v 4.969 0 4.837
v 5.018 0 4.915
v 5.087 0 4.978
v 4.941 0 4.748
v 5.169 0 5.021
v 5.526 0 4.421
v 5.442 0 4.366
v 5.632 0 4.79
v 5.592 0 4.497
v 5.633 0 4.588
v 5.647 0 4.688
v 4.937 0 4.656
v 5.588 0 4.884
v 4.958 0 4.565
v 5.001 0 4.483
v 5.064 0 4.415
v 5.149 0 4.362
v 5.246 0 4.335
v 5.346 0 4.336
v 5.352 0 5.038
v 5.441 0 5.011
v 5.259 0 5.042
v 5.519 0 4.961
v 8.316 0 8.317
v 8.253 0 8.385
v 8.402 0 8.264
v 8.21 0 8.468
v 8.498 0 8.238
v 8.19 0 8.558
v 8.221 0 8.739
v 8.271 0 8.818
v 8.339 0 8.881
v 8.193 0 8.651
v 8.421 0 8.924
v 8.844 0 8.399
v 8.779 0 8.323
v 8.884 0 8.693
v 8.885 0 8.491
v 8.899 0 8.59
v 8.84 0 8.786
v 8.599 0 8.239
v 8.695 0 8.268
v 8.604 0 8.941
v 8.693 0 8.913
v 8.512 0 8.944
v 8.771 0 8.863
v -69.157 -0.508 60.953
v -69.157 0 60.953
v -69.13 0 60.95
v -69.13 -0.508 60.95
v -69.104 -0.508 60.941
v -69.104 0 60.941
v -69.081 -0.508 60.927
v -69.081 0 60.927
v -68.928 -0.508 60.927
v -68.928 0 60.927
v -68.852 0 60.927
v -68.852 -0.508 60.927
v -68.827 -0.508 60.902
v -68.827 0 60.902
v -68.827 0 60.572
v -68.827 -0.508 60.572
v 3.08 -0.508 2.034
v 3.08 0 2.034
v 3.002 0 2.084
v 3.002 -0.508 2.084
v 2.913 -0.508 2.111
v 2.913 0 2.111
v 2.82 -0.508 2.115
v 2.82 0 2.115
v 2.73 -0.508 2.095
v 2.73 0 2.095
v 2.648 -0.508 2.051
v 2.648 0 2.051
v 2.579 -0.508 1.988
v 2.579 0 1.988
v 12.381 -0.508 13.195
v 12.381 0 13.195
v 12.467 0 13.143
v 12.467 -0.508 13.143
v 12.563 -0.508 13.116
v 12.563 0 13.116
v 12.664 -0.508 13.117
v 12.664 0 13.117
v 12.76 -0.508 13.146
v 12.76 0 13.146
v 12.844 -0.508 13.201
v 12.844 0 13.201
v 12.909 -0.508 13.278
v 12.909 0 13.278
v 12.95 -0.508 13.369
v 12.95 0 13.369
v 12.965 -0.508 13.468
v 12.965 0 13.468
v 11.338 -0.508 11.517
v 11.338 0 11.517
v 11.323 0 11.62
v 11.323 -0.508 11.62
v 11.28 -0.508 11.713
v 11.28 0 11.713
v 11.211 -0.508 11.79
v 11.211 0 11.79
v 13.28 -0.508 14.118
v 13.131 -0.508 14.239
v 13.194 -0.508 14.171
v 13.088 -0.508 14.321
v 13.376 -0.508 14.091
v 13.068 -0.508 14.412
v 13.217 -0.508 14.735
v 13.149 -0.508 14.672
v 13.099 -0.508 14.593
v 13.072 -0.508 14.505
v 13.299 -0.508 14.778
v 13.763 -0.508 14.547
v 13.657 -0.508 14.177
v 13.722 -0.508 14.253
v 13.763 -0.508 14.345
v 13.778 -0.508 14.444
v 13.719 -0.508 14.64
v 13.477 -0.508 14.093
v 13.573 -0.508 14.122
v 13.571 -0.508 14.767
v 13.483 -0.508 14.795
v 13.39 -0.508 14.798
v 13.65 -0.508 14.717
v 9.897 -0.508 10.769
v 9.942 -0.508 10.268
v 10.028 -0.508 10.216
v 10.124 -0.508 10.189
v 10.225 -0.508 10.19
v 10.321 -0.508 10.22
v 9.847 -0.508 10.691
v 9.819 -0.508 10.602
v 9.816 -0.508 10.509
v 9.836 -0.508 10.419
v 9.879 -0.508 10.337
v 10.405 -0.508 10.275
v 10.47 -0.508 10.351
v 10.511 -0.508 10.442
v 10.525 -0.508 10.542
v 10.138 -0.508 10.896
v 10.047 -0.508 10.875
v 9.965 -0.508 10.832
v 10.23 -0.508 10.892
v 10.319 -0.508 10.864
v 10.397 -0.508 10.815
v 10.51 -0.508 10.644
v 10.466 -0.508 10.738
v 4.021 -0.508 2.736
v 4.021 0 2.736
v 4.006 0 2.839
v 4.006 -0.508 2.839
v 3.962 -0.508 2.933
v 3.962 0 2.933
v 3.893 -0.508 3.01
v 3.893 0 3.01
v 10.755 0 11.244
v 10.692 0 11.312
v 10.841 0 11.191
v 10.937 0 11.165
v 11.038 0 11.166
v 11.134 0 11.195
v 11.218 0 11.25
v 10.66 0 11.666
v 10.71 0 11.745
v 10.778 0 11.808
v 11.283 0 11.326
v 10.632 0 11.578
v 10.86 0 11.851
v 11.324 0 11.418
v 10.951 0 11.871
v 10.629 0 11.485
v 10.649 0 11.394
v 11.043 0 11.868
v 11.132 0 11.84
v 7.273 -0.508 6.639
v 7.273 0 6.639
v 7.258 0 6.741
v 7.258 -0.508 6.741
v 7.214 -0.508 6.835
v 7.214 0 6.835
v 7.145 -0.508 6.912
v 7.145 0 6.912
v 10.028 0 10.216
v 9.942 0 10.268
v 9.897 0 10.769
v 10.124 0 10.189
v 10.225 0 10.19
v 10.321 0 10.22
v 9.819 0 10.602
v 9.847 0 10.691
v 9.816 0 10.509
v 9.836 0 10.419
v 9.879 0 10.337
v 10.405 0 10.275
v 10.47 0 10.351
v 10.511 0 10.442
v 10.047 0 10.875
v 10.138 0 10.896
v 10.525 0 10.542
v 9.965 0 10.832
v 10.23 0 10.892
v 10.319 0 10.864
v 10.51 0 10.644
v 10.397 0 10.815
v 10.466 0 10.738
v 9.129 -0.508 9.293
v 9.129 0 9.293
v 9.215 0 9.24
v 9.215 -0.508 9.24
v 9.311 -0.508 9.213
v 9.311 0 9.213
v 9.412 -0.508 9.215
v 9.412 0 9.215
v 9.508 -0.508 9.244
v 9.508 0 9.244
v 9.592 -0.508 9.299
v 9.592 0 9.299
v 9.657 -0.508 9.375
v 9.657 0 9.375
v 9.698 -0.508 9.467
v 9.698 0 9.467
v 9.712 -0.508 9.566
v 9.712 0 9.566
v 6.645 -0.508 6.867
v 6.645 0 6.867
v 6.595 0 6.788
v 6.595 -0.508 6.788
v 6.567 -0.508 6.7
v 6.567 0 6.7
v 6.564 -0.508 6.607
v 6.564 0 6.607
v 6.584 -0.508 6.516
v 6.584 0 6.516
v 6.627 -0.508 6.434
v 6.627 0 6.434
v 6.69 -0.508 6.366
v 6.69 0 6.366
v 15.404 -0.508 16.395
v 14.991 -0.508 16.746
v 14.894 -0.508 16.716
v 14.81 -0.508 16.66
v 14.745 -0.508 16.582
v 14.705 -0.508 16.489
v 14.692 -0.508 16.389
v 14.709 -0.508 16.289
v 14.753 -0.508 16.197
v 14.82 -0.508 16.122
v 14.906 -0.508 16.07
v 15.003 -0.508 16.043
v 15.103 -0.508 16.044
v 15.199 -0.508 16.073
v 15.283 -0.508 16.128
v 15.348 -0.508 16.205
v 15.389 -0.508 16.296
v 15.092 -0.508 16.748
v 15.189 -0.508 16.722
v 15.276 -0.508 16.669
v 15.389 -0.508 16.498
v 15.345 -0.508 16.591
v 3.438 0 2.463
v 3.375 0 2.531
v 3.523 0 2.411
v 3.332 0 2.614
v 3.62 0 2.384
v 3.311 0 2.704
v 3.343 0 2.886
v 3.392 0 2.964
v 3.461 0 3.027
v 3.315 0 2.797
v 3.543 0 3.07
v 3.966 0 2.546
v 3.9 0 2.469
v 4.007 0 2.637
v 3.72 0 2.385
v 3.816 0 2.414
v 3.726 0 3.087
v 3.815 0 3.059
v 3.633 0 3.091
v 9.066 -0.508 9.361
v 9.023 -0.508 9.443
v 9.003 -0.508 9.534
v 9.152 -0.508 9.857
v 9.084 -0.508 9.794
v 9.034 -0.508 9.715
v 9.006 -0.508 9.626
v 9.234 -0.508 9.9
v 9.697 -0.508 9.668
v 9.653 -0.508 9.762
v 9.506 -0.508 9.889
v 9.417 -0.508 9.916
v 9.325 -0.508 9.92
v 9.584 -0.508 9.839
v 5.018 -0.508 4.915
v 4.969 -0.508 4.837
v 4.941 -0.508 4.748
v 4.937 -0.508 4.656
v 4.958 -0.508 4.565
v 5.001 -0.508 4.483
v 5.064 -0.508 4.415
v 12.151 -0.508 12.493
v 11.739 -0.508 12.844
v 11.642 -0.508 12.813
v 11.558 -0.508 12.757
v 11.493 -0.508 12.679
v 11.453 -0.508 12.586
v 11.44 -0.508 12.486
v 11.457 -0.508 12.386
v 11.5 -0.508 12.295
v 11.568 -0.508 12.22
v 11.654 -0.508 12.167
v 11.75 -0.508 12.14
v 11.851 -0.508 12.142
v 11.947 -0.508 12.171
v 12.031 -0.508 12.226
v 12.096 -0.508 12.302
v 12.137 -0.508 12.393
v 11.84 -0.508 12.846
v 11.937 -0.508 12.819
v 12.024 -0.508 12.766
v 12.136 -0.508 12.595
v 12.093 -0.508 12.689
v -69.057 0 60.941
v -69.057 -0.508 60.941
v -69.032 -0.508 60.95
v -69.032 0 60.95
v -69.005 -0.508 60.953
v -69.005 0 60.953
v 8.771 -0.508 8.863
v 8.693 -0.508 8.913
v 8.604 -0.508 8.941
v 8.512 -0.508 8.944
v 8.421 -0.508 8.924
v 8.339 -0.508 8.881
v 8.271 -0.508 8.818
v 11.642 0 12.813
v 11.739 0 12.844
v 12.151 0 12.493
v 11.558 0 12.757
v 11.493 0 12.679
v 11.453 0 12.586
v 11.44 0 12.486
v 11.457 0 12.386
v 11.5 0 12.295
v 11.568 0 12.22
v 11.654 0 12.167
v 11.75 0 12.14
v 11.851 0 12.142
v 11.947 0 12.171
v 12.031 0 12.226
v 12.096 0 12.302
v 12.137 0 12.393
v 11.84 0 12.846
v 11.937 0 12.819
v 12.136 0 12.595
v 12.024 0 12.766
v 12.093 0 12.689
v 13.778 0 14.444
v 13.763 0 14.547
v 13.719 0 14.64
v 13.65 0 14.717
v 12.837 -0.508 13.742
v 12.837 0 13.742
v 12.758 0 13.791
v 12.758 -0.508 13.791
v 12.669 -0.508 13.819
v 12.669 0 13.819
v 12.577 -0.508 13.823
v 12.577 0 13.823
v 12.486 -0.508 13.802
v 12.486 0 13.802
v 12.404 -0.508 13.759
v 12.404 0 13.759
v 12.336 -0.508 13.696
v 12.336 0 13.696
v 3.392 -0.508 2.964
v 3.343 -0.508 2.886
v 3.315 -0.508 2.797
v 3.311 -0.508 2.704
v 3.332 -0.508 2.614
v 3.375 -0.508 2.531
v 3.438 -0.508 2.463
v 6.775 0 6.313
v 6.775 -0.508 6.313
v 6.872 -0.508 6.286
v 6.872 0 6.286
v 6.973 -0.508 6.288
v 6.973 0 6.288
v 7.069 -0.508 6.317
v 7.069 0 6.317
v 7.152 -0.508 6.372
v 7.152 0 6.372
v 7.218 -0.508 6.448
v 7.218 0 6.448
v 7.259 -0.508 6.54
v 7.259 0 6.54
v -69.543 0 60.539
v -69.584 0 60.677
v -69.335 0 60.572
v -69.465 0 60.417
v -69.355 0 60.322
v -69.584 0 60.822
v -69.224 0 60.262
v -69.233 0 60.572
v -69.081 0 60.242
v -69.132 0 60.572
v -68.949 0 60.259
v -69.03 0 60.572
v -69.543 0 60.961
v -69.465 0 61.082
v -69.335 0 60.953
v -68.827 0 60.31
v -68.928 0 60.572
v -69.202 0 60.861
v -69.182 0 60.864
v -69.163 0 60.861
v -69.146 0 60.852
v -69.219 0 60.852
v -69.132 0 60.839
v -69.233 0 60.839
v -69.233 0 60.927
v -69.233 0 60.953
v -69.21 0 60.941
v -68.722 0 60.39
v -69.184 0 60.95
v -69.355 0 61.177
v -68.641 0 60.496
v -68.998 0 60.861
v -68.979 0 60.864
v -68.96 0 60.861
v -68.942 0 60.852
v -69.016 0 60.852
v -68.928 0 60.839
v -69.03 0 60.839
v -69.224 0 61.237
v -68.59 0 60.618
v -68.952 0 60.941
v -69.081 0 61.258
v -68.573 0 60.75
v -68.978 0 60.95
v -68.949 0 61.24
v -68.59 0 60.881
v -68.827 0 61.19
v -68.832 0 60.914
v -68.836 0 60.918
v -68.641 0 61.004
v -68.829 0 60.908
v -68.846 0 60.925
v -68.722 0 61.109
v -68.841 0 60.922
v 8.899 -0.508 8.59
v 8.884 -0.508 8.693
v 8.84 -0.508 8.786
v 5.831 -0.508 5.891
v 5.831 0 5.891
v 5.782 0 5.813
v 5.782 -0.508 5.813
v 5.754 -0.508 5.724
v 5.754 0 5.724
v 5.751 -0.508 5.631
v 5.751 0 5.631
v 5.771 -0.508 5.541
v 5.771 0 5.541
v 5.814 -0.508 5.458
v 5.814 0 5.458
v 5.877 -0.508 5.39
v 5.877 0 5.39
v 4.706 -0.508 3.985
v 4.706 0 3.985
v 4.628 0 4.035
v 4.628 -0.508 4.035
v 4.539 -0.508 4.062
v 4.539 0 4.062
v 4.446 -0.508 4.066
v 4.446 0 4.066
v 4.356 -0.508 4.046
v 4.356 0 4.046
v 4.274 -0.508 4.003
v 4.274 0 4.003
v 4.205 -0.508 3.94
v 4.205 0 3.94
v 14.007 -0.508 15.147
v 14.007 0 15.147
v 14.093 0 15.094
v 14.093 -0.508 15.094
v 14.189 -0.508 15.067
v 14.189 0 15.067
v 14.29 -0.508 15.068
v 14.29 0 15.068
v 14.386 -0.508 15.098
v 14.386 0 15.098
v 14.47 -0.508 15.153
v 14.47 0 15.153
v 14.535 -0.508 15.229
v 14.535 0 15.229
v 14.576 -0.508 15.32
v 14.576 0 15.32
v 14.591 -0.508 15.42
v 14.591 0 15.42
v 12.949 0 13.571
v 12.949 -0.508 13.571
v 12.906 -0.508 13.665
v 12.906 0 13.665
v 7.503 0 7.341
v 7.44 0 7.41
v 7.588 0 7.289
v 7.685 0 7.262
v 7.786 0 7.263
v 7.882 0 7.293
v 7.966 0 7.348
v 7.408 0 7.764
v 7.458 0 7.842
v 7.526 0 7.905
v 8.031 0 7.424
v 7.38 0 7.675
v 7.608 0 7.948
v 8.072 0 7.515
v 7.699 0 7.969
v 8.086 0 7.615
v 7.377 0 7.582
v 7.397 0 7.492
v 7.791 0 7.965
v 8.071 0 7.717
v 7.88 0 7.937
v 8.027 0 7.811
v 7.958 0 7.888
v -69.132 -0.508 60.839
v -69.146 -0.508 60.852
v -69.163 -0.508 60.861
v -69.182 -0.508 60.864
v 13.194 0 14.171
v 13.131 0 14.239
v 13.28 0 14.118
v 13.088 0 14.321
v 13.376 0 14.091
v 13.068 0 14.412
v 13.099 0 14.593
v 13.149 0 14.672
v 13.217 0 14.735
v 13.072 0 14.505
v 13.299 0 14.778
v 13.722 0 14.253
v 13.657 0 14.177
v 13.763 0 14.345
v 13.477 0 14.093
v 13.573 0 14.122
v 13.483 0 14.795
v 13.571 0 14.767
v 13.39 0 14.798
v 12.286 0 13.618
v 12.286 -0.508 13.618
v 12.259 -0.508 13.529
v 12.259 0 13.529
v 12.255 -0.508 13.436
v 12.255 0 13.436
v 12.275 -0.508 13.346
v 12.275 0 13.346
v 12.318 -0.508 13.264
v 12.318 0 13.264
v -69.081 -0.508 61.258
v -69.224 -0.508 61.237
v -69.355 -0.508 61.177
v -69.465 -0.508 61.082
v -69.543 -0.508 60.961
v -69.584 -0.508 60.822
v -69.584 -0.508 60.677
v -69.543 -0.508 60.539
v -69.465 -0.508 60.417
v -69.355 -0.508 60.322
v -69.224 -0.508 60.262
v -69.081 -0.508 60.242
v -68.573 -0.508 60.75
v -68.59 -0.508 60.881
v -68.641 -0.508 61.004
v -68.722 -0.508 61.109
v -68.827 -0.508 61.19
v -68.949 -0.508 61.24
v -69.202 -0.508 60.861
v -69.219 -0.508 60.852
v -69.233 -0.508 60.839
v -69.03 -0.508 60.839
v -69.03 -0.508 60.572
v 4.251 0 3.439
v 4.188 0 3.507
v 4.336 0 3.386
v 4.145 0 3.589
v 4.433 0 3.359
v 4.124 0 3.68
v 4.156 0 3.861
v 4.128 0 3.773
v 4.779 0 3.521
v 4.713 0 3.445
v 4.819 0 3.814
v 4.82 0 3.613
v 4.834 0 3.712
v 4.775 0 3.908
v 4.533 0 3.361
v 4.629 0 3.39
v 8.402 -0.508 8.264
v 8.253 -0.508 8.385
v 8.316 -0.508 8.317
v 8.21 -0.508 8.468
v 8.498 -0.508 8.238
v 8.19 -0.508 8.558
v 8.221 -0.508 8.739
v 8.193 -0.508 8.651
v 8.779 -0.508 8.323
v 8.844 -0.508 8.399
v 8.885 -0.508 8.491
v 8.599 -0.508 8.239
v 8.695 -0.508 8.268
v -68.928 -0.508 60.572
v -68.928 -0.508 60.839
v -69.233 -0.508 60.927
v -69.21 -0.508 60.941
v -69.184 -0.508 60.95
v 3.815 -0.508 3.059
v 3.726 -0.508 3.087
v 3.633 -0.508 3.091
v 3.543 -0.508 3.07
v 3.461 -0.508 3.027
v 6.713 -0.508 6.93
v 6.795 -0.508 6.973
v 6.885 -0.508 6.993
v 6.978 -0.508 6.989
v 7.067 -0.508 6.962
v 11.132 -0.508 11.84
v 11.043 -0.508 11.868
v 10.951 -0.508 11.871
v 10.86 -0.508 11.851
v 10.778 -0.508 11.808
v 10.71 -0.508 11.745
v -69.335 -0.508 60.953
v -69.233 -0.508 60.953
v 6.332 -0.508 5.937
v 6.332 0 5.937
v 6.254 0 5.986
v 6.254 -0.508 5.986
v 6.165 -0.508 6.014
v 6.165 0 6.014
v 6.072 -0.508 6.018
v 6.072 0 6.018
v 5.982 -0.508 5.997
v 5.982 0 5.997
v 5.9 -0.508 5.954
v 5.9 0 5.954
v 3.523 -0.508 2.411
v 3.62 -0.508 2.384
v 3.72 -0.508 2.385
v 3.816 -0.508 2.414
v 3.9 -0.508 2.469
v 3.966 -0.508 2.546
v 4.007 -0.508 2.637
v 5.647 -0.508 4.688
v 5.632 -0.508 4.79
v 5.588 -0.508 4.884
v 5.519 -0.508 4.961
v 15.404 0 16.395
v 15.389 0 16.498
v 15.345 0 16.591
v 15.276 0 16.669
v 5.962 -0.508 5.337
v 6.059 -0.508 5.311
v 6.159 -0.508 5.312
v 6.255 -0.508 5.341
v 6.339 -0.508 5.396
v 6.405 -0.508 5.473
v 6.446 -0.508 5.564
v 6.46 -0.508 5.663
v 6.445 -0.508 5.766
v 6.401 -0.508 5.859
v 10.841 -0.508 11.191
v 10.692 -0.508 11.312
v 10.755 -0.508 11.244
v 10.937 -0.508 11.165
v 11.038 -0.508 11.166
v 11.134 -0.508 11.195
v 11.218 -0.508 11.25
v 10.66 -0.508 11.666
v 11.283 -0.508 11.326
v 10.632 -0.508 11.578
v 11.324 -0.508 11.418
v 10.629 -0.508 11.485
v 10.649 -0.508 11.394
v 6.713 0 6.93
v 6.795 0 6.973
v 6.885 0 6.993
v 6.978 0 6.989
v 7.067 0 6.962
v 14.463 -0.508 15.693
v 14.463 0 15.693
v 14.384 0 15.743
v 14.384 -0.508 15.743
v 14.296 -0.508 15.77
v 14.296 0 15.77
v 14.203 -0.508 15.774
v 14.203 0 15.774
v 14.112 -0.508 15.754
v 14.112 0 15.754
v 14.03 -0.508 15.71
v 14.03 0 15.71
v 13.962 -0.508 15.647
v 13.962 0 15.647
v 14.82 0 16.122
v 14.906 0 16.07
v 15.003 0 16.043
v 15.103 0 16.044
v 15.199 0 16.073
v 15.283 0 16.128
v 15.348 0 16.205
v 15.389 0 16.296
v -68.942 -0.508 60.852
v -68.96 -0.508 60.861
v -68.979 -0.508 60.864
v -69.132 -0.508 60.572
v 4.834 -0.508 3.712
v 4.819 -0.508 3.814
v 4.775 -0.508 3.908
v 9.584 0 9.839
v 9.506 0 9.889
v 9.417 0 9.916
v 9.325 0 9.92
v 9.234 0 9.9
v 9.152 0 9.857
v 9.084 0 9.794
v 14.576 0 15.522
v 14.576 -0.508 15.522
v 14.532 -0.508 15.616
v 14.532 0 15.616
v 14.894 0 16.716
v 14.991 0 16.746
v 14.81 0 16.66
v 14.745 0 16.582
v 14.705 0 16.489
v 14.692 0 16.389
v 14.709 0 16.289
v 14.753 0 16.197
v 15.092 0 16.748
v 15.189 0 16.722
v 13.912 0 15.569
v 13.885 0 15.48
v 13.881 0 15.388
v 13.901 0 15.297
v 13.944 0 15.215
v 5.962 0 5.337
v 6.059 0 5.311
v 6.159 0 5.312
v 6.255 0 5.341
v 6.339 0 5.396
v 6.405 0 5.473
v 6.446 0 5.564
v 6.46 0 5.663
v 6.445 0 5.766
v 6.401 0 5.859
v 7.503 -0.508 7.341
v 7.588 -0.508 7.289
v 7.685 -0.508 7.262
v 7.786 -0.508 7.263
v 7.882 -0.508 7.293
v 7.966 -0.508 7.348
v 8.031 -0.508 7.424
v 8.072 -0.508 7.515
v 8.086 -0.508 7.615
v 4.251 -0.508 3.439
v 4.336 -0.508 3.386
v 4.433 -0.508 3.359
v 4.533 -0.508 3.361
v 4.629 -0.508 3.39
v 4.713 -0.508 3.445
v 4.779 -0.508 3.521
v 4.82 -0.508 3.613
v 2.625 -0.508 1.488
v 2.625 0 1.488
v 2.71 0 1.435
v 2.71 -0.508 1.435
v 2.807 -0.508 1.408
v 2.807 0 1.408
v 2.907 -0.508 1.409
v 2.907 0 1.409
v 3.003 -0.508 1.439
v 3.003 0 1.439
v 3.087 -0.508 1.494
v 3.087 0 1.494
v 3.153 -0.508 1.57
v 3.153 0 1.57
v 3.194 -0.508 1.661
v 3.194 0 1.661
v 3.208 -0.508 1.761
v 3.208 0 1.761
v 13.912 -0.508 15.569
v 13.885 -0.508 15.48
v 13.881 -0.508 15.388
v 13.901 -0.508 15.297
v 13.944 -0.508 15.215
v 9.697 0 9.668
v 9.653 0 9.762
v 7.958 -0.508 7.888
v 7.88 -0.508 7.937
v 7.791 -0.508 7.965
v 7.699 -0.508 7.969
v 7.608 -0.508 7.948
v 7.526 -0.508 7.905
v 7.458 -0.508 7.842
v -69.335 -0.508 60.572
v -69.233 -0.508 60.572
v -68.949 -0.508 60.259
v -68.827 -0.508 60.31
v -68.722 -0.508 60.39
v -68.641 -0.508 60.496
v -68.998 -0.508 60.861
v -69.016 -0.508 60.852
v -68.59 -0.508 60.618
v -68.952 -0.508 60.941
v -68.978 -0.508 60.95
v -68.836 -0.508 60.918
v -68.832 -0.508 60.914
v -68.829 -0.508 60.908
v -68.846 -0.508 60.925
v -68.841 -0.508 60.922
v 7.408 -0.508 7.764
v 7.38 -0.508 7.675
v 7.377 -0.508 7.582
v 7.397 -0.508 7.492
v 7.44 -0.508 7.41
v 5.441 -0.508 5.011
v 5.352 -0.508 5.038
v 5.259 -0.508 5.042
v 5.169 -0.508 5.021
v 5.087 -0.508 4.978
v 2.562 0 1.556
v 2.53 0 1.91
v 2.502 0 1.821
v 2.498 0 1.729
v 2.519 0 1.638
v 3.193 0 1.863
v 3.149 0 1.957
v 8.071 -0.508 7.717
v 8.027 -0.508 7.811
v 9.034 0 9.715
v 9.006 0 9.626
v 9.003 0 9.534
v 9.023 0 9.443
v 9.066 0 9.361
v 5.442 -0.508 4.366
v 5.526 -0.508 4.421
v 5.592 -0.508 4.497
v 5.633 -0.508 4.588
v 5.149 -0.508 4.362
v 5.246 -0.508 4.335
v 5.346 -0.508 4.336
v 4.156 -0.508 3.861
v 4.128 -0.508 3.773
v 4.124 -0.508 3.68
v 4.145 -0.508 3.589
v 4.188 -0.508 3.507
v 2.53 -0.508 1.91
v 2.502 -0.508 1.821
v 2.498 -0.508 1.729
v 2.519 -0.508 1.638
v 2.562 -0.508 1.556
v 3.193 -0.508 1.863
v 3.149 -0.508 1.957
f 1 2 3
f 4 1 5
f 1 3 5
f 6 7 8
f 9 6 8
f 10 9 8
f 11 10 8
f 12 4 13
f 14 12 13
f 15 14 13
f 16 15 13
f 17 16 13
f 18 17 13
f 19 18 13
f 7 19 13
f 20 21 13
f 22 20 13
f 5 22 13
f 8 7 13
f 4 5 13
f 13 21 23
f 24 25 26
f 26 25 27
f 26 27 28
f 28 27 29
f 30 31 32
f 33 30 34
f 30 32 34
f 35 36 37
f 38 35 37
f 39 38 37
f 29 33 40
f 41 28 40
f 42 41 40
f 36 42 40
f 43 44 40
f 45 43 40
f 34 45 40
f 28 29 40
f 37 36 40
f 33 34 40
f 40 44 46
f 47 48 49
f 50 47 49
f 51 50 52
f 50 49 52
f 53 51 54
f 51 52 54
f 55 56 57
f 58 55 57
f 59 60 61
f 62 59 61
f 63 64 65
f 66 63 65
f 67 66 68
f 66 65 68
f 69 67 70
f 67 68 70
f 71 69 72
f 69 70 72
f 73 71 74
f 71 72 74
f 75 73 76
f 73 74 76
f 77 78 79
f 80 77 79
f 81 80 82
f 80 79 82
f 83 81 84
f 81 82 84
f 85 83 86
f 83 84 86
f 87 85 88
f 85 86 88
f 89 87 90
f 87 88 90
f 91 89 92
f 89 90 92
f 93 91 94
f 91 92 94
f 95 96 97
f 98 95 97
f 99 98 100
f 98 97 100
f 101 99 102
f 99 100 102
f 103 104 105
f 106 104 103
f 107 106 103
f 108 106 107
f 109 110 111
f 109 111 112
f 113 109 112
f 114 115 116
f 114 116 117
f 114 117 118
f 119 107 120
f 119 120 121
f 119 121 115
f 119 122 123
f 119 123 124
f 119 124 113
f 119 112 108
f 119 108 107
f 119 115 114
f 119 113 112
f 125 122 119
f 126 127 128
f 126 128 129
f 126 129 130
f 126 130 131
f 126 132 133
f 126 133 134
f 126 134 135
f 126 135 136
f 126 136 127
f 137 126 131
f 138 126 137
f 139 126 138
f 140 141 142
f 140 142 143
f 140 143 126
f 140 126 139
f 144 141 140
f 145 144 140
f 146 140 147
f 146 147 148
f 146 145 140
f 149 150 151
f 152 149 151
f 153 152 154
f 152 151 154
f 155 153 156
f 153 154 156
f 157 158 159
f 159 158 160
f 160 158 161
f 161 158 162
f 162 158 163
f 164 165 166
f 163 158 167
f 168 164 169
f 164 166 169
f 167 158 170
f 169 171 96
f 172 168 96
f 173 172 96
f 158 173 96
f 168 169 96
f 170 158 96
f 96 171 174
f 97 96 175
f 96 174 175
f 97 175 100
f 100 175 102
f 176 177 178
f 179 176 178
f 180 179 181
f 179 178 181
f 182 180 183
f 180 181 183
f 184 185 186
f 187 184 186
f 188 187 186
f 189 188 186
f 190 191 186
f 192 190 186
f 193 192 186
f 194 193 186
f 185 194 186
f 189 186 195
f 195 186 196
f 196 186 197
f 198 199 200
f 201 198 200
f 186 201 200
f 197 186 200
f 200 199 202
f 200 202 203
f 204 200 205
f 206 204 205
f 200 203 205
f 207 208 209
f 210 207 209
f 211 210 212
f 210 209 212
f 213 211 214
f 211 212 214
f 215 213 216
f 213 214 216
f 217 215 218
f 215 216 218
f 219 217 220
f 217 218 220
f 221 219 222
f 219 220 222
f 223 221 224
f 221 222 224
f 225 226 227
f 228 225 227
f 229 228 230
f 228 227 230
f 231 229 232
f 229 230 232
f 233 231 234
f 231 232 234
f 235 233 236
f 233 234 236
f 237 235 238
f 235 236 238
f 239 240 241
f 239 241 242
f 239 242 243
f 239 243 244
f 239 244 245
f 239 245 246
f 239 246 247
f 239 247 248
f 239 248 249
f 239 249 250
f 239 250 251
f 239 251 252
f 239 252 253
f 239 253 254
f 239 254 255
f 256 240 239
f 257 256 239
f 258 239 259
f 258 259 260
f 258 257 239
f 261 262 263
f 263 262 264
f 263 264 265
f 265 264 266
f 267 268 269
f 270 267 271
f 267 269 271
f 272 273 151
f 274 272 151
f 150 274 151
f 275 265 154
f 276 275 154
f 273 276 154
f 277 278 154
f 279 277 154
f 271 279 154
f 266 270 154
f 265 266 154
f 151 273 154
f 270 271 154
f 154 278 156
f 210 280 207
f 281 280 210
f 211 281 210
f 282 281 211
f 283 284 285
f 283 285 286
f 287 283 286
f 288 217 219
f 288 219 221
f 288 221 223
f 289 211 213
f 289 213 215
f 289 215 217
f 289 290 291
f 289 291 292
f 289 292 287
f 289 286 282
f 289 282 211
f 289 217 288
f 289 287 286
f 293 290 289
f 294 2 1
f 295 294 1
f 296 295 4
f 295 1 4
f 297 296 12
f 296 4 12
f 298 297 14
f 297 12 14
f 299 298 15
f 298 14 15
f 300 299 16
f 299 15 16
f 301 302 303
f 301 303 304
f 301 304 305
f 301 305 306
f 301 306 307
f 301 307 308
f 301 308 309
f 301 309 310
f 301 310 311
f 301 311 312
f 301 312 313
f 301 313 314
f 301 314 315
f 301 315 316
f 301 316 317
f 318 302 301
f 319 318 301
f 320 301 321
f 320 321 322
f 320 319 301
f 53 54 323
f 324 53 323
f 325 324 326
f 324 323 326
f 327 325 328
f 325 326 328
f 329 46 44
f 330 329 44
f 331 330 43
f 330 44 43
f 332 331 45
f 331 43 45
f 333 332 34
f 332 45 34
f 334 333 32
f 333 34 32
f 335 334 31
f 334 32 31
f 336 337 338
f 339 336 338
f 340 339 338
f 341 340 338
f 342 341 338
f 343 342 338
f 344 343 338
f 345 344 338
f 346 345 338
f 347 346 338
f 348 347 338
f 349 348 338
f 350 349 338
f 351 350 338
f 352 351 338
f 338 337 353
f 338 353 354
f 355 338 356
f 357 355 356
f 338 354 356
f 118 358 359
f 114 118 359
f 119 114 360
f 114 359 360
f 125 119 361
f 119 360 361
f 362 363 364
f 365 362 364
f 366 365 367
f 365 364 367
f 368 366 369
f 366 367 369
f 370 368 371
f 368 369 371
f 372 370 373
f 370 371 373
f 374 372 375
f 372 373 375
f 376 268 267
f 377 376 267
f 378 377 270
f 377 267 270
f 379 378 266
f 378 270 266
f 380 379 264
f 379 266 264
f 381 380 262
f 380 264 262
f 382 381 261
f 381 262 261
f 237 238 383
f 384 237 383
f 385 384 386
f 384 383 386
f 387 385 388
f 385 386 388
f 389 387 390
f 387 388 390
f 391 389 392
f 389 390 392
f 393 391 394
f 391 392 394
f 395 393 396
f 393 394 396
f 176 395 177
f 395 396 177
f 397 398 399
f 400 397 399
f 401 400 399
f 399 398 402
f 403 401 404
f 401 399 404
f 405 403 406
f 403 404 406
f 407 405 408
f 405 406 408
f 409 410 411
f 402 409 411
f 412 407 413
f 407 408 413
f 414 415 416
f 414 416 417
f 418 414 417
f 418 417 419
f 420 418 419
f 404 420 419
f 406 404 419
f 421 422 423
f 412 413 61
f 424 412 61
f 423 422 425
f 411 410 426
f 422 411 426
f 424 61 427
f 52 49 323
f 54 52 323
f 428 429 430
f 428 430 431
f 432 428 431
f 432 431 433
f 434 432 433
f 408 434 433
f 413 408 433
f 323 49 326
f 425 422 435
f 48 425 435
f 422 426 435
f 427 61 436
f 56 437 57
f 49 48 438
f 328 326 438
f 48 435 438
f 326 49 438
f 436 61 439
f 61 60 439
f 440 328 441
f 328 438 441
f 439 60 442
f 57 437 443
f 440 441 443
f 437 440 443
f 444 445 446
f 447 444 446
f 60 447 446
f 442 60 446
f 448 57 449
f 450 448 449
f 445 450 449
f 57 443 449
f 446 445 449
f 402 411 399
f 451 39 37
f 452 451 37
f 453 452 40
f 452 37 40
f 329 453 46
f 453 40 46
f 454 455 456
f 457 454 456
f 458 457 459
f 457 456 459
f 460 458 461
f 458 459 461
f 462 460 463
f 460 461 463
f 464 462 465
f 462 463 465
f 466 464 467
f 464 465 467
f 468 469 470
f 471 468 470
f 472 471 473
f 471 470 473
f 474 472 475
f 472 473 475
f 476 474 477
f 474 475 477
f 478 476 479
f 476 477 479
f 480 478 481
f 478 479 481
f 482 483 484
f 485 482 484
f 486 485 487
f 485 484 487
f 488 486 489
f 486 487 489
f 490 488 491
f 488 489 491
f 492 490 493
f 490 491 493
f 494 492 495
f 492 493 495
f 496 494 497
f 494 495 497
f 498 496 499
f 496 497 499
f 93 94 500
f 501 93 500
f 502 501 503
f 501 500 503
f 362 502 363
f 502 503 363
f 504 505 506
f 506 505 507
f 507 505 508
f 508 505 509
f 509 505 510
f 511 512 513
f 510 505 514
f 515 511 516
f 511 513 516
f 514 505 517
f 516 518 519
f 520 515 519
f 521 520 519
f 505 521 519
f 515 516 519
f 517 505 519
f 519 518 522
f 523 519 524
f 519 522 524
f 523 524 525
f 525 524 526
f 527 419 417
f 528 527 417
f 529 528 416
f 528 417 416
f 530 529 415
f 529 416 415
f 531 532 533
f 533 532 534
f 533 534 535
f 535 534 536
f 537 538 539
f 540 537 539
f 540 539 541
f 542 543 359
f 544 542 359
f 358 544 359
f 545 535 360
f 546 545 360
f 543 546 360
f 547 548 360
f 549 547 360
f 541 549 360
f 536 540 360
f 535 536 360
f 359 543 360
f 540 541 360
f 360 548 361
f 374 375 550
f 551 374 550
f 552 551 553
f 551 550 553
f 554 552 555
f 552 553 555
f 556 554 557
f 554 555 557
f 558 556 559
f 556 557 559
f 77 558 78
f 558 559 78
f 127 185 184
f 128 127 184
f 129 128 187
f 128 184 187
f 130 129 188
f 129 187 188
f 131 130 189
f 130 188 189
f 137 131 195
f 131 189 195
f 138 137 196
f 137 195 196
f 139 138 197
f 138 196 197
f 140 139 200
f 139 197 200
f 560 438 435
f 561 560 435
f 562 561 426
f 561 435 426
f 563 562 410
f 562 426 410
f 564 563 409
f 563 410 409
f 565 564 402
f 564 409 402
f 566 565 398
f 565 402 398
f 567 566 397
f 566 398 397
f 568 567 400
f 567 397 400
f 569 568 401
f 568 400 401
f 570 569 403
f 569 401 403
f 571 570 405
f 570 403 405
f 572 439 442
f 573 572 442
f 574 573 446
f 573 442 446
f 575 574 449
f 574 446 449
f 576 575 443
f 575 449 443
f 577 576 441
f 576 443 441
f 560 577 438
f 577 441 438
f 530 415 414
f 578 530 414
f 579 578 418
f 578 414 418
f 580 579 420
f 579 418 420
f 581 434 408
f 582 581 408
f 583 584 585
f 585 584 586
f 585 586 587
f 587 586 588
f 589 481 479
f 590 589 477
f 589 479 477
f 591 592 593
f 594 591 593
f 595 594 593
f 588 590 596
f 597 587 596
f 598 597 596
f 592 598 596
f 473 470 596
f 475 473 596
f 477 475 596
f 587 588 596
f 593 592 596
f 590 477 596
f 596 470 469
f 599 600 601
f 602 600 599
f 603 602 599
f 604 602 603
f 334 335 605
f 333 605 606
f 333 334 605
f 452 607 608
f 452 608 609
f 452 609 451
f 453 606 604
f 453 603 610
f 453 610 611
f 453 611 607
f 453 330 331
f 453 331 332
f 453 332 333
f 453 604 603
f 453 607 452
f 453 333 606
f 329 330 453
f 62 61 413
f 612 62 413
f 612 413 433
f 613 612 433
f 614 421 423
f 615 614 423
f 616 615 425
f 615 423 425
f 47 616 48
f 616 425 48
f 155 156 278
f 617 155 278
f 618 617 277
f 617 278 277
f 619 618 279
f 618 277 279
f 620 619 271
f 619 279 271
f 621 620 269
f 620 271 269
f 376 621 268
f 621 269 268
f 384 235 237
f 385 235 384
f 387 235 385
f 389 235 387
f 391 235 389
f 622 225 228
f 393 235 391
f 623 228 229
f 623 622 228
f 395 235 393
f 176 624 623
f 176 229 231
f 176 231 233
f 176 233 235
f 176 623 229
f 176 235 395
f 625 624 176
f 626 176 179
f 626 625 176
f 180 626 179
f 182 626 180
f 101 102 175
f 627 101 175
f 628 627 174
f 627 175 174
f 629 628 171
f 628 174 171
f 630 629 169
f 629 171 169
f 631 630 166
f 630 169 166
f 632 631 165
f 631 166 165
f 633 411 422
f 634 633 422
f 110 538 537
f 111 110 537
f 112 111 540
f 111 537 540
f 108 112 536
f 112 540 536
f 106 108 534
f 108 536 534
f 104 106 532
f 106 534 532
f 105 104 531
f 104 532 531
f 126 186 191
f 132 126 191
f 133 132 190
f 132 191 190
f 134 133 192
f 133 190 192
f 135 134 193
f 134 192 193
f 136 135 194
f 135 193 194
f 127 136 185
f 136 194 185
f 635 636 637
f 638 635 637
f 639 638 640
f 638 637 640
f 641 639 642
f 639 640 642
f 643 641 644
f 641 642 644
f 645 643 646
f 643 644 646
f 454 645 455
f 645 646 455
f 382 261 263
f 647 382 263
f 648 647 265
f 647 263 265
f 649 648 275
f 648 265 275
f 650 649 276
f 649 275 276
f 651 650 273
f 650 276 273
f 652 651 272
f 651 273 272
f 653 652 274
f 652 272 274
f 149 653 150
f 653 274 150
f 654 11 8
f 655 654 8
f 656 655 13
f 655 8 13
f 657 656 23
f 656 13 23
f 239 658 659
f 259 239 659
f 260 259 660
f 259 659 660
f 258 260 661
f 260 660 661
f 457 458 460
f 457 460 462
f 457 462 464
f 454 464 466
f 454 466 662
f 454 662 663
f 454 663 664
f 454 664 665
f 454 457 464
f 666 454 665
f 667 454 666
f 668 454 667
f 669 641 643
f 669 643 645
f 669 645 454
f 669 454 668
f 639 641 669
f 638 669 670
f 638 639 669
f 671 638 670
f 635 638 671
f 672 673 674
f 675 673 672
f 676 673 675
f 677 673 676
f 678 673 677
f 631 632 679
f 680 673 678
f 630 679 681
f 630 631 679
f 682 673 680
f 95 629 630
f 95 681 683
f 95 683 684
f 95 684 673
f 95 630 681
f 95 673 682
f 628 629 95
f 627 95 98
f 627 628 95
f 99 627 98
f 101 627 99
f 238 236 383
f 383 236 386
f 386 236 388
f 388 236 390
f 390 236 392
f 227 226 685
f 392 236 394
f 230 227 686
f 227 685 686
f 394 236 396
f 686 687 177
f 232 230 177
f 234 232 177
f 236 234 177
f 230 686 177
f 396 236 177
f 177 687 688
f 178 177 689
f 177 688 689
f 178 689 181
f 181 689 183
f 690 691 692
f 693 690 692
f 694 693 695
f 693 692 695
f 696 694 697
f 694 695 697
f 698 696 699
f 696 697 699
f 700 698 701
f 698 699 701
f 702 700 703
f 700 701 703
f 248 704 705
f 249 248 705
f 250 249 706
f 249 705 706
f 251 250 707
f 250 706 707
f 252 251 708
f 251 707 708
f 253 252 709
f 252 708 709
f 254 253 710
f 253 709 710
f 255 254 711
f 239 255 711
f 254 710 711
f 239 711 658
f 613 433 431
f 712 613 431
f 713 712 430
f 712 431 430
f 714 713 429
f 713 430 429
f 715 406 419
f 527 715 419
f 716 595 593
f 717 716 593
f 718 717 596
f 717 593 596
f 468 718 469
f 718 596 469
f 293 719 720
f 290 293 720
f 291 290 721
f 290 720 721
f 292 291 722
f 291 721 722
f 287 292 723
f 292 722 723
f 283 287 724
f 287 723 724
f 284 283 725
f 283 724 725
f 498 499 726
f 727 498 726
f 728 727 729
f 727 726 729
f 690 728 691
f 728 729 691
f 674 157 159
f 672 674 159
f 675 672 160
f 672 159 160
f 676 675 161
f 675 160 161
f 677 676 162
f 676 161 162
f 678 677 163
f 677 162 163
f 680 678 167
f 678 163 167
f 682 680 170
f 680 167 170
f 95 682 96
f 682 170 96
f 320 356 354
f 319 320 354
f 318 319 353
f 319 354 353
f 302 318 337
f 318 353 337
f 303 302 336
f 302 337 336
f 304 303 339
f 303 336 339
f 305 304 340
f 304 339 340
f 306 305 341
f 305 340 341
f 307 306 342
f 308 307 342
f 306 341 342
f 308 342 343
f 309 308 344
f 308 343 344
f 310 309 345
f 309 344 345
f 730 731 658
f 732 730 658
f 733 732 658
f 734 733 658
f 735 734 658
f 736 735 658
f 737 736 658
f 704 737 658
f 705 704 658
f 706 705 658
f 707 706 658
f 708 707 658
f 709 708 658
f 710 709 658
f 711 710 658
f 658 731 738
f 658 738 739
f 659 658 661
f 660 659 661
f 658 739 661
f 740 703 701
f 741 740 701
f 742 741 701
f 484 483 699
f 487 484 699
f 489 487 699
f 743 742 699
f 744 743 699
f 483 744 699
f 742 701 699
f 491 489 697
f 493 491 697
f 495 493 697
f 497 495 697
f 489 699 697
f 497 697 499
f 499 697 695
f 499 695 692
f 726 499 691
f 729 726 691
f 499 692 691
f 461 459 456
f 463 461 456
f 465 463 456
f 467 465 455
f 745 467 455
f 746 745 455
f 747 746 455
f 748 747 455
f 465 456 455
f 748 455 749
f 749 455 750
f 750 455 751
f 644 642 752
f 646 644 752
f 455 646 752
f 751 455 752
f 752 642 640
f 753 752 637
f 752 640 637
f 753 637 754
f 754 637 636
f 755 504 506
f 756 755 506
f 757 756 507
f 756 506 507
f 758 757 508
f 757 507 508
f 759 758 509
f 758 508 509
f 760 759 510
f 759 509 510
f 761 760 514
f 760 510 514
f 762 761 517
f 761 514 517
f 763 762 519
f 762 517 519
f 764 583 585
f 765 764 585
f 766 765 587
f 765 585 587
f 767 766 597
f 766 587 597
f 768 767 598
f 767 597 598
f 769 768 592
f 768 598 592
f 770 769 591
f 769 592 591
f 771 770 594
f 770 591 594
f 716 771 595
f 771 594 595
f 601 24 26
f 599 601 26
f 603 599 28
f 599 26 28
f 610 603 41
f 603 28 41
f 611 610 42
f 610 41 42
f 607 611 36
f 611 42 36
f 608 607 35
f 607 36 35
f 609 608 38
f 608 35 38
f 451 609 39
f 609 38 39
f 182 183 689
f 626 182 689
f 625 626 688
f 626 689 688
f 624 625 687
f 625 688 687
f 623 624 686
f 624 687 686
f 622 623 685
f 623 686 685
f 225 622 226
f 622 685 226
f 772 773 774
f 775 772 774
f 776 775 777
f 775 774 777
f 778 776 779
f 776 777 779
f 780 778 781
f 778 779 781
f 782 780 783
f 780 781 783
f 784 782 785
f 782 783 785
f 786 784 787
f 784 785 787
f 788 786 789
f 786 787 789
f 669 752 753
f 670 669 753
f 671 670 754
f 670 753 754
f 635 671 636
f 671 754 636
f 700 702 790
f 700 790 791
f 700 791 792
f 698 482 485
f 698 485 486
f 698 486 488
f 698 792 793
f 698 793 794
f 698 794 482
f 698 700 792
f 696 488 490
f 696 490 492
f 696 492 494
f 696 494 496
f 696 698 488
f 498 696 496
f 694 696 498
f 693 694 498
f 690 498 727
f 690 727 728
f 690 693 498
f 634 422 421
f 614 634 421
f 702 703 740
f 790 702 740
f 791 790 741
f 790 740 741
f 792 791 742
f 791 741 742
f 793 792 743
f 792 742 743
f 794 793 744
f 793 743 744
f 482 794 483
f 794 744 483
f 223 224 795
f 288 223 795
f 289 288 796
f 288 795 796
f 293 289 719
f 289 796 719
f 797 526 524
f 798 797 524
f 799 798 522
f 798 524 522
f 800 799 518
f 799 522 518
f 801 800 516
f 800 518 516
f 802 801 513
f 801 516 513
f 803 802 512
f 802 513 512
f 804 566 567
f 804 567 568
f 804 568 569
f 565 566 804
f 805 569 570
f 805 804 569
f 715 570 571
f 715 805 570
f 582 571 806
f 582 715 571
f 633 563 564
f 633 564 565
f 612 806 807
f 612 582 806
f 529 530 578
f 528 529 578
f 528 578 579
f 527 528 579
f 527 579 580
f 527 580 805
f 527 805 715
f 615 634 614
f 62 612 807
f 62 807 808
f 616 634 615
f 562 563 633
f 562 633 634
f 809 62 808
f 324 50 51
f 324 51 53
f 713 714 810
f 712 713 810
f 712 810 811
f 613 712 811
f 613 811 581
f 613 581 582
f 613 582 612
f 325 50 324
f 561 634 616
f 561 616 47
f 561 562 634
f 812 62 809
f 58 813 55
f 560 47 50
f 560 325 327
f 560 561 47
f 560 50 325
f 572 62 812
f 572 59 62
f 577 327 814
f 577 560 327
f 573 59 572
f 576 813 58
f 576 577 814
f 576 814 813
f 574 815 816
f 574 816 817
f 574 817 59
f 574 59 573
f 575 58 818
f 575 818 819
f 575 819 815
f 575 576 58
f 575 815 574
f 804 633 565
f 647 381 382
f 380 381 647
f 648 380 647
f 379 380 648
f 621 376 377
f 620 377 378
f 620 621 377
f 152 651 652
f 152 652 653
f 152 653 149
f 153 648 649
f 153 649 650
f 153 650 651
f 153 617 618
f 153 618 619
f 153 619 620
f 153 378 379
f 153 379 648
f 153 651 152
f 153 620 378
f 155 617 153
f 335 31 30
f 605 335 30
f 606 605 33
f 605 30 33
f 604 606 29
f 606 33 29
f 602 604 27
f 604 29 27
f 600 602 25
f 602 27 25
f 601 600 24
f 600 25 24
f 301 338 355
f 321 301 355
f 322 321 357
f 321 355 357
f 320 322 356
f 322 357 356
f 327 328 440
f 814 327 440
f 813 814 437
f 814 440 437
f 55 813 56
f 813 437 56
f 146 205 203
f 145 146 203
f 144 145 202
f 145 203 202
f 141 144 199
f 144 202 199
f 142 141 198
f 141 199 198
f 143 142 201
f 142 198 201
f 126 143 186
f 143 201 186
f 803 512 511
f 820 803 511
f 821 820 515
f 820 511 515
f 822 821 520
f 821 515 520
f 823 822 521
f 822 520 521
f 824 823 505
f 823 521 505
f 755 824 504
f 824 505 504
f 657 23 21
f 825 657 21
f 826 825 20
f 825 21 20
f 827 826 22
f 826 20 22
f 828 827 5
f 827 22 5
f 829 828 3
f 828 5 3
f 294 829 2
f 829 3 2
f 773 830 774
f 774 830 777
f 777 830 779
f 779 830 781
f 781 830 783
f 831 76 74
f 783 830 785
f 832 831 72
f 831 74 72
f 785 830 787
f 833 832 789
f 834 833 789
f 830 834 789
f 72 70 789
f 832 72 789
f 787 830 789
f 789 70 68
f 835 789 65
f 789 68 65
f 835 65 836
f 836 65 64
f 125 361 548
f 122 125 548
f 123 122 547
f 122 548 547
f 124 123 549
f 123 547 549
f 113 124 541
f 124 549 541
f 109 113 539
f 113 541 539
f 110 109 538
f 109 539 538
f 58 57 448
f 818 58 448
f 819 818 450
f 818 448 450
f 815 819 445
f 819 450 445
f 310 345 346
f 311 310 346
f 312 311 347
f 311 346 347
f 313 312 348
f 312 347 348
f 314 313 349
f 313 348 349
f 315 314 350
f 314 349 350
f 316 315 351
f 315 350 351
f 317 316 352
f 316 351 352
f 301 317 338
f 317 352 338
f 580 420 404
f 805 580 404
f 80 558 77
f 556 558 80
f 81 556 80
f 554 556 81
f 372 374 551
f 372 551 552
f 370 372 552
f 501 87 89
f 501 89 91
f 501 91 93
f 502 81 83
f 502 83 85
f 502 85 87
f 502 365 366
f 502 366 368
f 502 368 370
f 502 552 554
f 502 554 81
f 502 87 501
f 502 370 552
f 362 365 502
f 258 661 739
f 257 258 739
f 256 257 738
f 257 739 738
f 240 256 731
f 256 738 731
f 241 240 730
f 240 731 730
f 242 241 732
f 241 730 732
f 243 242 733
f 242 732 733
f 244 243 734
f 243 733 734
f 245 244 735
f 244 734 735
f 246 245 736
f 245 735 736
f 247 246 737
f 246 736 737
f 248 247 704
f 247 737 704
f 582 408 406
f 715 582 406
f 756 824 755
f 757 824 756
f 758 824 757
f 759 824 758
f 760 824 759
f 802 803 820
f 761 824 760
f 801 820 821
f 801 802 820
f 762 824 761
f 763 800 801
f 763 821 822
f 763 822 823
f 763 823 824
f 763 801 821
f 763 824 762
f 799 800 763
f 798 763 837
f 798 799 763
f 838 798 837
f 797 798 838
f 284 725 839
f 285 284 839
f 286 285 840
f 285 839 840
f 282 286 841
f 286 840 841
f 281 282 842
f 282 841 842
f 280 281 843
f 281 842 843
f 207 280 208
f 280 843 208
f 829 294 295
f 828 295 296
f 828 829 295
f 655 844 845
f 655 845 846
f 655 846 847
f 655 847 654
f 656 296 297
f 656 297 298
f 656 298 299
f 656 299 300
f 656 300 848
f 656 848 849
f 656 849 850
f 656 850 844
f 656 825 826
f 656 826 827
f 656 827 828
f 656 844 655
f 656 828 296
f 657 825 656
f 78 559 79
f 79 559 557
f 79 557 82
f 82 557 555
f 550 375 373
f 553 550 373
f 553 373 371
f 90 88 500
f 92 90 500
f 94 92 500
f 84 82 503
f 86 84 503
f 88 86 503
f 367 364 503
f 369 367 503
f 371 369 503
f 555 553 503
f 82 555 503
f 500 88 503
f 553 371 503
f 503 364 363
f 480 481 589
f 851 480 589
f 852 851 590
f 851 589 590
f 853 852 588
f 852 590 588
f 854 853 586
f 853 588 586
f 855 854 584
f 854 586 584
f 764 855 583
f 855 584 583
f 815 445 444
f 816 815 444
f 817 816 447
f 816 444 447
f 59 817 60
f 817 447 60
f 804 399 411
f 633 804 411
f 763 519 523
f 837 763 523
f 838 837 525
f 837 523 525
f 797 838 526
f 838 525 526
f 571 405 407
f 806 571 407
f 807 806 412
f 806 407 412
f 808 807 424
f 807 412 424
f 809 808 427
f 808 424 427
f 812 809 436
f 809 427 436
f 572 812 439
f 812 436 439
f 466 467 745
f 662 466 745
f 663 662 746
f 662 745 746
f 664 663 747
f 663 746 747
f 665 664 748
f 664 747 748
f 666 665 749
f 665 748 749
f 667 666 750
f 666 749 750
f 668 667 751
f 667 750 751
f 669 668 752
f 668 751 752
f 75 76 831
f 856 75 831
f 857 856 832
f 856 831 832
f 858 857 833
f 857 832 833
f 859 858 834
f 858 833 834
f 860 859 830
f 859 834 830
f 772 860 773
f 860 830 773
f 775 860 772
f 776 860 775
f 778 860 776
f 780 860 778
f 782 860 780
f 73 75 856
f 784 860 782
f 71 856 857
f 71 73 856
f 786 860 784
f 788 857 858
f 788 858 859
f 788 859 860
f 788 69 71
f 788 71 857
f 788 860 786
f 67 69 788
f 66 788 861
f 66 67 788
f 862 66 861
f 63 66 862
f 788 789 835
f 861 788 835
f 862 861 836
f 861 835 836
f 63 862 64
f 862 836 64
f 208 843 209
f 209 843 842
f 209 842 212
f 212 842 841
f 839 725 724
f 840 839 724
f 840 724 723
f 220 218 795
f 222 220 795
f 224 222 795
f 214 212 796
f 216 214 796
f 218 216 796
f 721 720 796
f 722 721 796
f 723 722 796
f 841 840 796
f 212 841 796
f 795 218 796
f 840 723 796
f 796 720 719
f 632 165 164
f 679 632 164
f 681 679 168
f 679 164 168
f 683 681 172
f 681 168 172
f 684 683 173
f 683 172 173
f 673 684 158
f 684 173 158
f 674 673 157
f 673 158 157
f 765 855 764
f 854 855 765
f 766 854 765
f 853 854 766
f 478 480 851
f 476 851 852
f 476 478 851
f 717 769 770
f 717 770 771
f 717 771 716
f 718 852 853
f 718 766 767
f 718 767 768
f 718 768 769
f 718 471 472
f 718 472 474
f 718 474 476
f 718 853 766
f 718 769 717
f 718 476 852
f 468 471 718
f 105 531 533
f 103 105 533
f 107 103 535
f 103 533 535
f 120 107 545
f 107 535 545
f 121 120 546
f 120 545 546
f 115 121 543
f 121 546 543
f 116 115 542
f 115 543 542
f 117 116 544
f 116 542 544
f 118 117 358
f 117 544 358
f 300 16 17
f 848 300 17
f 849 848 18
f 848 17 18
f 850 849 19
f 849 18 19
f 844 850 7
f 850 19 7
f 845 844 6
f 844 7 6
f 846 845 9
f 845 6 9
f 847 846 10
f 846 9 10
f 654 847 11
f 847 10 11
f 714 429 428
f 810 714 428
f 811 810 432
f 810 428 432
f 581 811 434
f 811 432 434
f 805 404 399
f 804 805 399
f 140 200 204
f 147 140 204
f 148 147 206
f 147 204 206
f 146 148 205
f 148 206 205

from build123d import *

# Parameters (mm, degrees)
F1_DEPTH = 0.508


with BuildPart() as f1:
    # F0 (on Front) → F1 (new body)
    with BuildSketch(Plane.XZ):
        with BuildLine():
            Line((-69.080764, 60.927495), (-69.080764, 61.257695))
            ThreePointArc((-69.080764, 61.257695), (-69.588764, 60.749695), (-69.080764, 60.241695))
            Line((-69.080764, 60.241695), (-69.080764, 60.571895))
            Line((-69.080764, 60.571895), (-69.131564, 60.571895))
            Line((-69.131564, 60.571895), (-69.131564, 60.838595))
            ThreePointArc((-69.131564, 60.838595), (-69.153966, 60.857291), (-69.182364, 60.863995))
            ThreePointArc((-69.182364, 60.863995), (-69.210762, 60.857291), (-69.233164, 60.838595))
            Line((-69.233164, 60.838595), (-69.233164, 60.571895))
            Line((-69.233164, 60.571895), (-69.334764, 60.571895))
            Line((-69.334764, 60.571895), (-69.334764, 60.749695))
            Line((-69.334764, 60.749695), (-69.334764, 60.952895))
            Line((-69.334764, 60.952895), (-69.233164, 60.952895))
            Line((-69.233164, 60.952895), (-69.233164, 60.927495))
            ThreePointArc((-69.233164, 60.927495), (-69.197125, 60.946378), (-69.156964, 60.952895))
            ThreePointArc((-69.156964, 60.952895), (-69.116803, 60.946378), (-69.080764, 60.927495))
        make_face()
        with BuildLine():
            ThreePointArc((-69.080764, 60.241695), (-68.721554, 60.390485), (-68.572764, 60.749695))
            ThreePointArc((-68.572764, 60.749695), (-68.721554, 61.108905), (-69.080764, 61.257695))
            Line((-69.080764, 61.257695), (-69.080764, 60.927495))
            ThreePointArc((-69.080764, 60.927495), (-69.044725, 60.946378), (-69.004564, 60.952895))
            ThreePointArc((-69.004564, 60.952895), (-68.964403, 60.946378), (-68.928364, 60.927495))
            Line((-68.928364, 60.927495), (-68.852164, 60.927495))
            ThreePointArc((-68.852164, 60.927495), (-68.843387, 60.924071), (-68.835872, 60.918387))
            ThreePointArc((-68.835872, 60.918387), (-68.830188, 60.910873), (-68.826764, 60.902095))
            Line((-68.826764, 60.902095), (-68.826764, 60.749695))
            Line((-68.826764, 60.749695), (-68.826764, 60.571895))
            Line((-68.826764, 60.571895), (-68.928364, 60.571895))
            Line((-68.928364, 60.571895), (-68.928364, 60.838595))
            ThreePointArc((-68.928364, 60.838595), (-68.950766, 60.857291), (-68.979164, 60.863995))
            ThreePointArc((-68.979164, 60.863995), (-69.007562, 60.857291), (-69.029964, 60.838595))
            Line((-69.029964, 60.838595), (-69.029964, 60.571895))
            Line((-69.029964, 60.571895), (-69.080764, 60.571895))
            Line((-69.080764, 60.571895), (-69.080764, 60.241695))
        make_face()
        with BuildLine():
            Line((10.982853, 11.517215), (10.755204, 11.244035))
            ThreePointArc((10.755204, 11.244035), (11.133683, 11.195187), (11.338453, 11.517215))
            ThreePointArc((11.338453, 11.517215), (11.304881, 11.668044), (11.210503, 11.790394))
            Line((11.210503, 11.790394), (10.982853, 11.517215))
        make_face()
        with BuildLine():
            Line((10.169819, 10.541574), (9.942169, 10.268394))
            ThreePointArc((9.942169, 10.268394), (10.320649, 10.219546), (10.525419, 10.541574))
            ThreePointArc((10.525419, 10.541574), (10.491847, 10.692403), (10.397469, 10.814753))
            Line((10.397469, 10.814753), (10.169819, 10.541574))
        make_face()
        with BuildLine():
            Line((7.457537, 7.8423), (7.730716, 7.614651))
            Line((7.730716, 7.614651), (7.958366, 7.88783))
            ThreePointArc((7.958366, 7.88783), (7.698522, 7.96879), (7.457537, 7.8423))
        make_face()
        with BuildLine():
            ThreePointArc((8.270571, 8.817941), (8.189611, 8.558097), (8.316101, 8.317112))
            Line((8.316101, 8.317112), (8.543751, 8.590292))
            Line((8.543751, 8.590292), (8.270571, 8.817941))
        make_face()
        with BuildLine():
            Line((3.080161, 2.033984), (2.852511, 1.760805))
            Line((2.852511, 1.760805), (2.624862, 1.487625))
            ThreePointArc((2.624862, 1.487625), (3.003341, 1.438777), (3.208111, 1.760805))
            ThreePointArc((3.208111, 1.760805), (3.174539, 1.911634), (3.080161, 2.033984))
        make_face()
        with BuildLine():
            ThreePointArc((7.457537, 7.8423), (7.376577, 7.582456), (7.503067, 7.341471))
            Line((7.503067, 7.341471), (7.730716, 7.614651))
            Line((7.730716, 7.614651), (7.457537, 7.8423))
        make_face()
        with BuildLine():
            ThreePointArc((5.831469, 5.891018), (5.750508, 5.631174), (5.876998, 5.390189))
            Line((5.876998, 5.390189), (6.104648, 5.663369))
            Line((6.104648, 5.663369), (5.831469, 5.891018))
        make_face()
        with BuildLine():
            Line((9.89664, 10.769223), (10.169819, 10.541574))
            Line((10.169819, 10.541574), (10.397469, 10.814753))
            ThreePointArc((10.397469, 10.814753), (10.137624, 10.895713), (9.89664, 10.769223))
        make_face()
        with BuildLine():
            Line((8.270571, 8.817941), (8.543751, 8.590292))
            Line((8.543751, 8.590292), (8.7714, 8.863471))
            ThreePointArc((8.7714, 8.863471), (8.511556, 8.944431), (8.270571, 8.817941))
        make_face()
        with BuildLine():
            ThreePointArc((4.2054, 3.939736), (4.12444, 3.679892), (4.25093, 3.438907))
            Line((4.25093, 3.438907), (4.47858, 3.712087))
            Line((4.47858, 3.712087), (4.2054, 3.939736))
        make_face()
        with BuildLine():
            Line((2.624862, 1.487625), (2.852511, 1.760805))
            Line((2.852511, 1.760805), (2.579332, 1.988454))
            ThreePointArc((2.579332, 1.988454), (2.498372, 1.72861), (2.624862, 1.487625))
        make_face()
        with BuildLine():
            Line((6.644503, 6.866659), (6.917682, 6.63901))
            Line((6.917682, 6.63901), (7.145332, 6.912189))
            ThreePointArc((7.145332, 6.912189), (6.885488, 6.993149), (6.644503, 6.866659))
        make_face()
        with BuildLine():
            ThreePointArc((5.018434, 4.915377), (4.937474, 4.655533), (5.063964, 4.414548))
            Line((5.063964, 4.414548), (5.291614, 4.687728))
            Line((5.291614, 4.687728), (5.018434, 4.915377))
        make_face()
        with BuildLine():
            Line((3.665546, 2.736446), (3.437896, 2.463266))
            ThreePointArc((3.437896, 2.463266), (3.816375, 2.414418), (4.021146, 2.736446))
            ThreePointArc((4.021146, 2.736446), (3.987573, 2.887275), (3.893195, 3.009625))
            Line((3.893195, 3.009625), (3.665546, 2.736446))
        make_face()
        with BuildLine():
            Line((4.2054, 3.939736), (4.47858, 3.712087))
            Line((4.47858, 3.712087), (4.706229, 3.985266))
            ThreePointArc((4.706229, 3.985266), (4.446385, 4.066226), (4.2054, 3.939736))
        make_face()
        with BuildLine():
            ThreePointArc((6.644503, 6.866659), (6.563543, 6.606815), (6.690033, 6.36583))
            Line((6.690033, 6.36583), (6.917682, 6.63901))
            Line((6.917682, 6.63901), (6.644503, 6.866659))
        make_face()
        with BuildLine():
            Line((4.47858, 3.712087), (4.25093, 3.438907))
            ThreePointArc((4.25093, 3.438907), (4.629409, 3.390059), (4.83418, 3.712087))
            ThreePointArc((4.83418, 3.712087), (4.800607, 3.862916), (4.706229, 3.985266))
            Line((4.706229, 3.985266), (4.47858, 3.712087))
        make_face()
        with BuildLine():
            Line((8.543751, 8.590292), (8.316101, 8.317112))
            ThreePointArc((8.316101, 8.317112), (8.69458, 8.268264), (8.899351, 8.590292))
            ThreePointArc((8.899351, 8.590292), (8.865778, 8.741121), (8.7714, 8.863471))
            Line((8.7714, 8.863471), (8.543751, 8.590292))
        make_face()
        with BuildLine():
            Line((10.709674, 11.744864), (10.982853, 11.517215))
            Line((10.982853, 11.517215), (11.210503, 11.790394))
            ThreePointArc((11.210503, 11.790394), (10.950659, 11.871354), (10.709674, 11.744864))
        make_face()
        with BuildLine():
            Line((5.831469, 5.891018), (6.104648, 5.663369))
            Line((6.104648, 5.663369), (6.332298, 5.936548))
            ThreePointArc((6.332298, 5.936548), (6.072454, 6.017508), (5.831469, 5.891018))
        make_face()
        with BuildLine():
            ThreePointArc((15.275674, 16.668599), (14.774845, 16.623069), (14.820375, 16.12224))
            Line((14.820375, 16.12224), (15.275674, 16.668599))
        make_face()
        with BuildLine():
            Line((15.275674, 16.668599), (14.820375, 16.12224))
            ThreePointArc((14.820375, 16.12224), (15.198854, 16.073392), (15.403624, 16.39542))
            ThreePointArc((15.403624, 16.39542), (15.370052, 16.54625), (15.275674, 16.668599))
        make_face()
        with BuildLine():
            ThreePointArc((12.023537, 12.766035), (11.522708, 12.720505), (11.568238, 12.219676))
            Line((11.568238, 12.219676), (12.023537, 12.766035))
        make_face()
        with BuildLine():
            Line((12.023537, 12.766035), (11.568238, 12.219676))
            ThreePointArc((11.568238, 12.219676), (11.946717, 12.170828), (12.151487, 12.492856))
            ThreePointArc((12.151487, 12.492856), (12.117915, 12.643685), (12.023537, 12.766035))
        make_face()
        with BuildLine():
            Line((14.23499, 15.419779), (14.00734, 15.146599))
            ThreePointArc((14.00734, 15.146599), (14.38582, 15.097751), (14.59059, 15.419779))
            ThreePointArc((14.59059, 15.419779), (14.557018, 15.570609), (14.46264, 15.692958))
            Line((14.46264, 15.692958), (14.23499, 15.419779))
        make_face()
        with BuildLine():
            ThreePointArc((13.96181, 15.647428), (13.88085, 15.387584), (14.00734, 15.146599))
            Line((14.00734, 15.146599), (14.23499, 15.419779))
            Line((14.23499, 15.419779), (13.96181, 15.647428))
        make_face()
        with BuildLine():
            Line((13.421956, 14.444138), (13.194306, 14.170958))
            ThreePointArc((13.194306, 14.170958), (13.572785, 14.12211), (13.777556, 14.444138))
            ThreePointArc((13.777556, 14.444138), (13.743983, 14.594967), (13.649605, 14.717317))
            Line((13.649605, 14.717317), (13.421956, 14.444138))
        make_face()
        with BuildLine():
            Line((13.148776, 14.671787), (13.421956, 14.444138))
            Line((13.421956, 14.444138), (13.649605, 14.717317))
            ThreePointArc((13.649605, 14.717317), (13.389761, 14.798277), (13.148776, 14.671787))
        make_face()
        with BuildLine():
            Line((12.608922, 13.468497), (12.381272, 13.195317))
            ThreePointArc((12.381272, 13.195317), (12.759751, 13.146469), (12.964522, 13.468497))
            ThreePointArc((12.964522, 13.468497), (12.930949, 13.619326), (12.836571, 13.741676))
            Line((12.836571, 13.741676), (12.608922, 13.468497))
        make_face()
        with BuildLine():
            ThreePointArc((13.148776, 14.671787), (13.067816, 14.411943), (13.194306, 14.170958))
            Line((13.194306, 14.170958), (13.421956, 14.444138))
            Line((13.421956, 14.444138), (13.148776, 14.671787))
        make_face()
        with BuildLine():
            Line((6.917682, 6.63901), (6.690033, 6.36583))
            ThreePointArc((6.690033, 6.36583), (7.068512, 6.316982), (7.273282, 6.63901))
            ThreePointArc((7.273282, 6.63901), (7.23971, 6.789839), (7.145332, 6.912189))
            Line((7.145332, 6.912189), (6.917682, 6.63901))
        make_face()
        with BuildLine():
            Line((2.579332, 1.988454), (2.852511, 1.760805))
            Line((2.852511, 1.760805), (3.080161, 2.033984))
            ThreePointArc((3.080161, 2.033984), (2.820317, 2.114944), (2.579332, 1.988454))
        make_face()
        with BuildLine():
            Line((12.335742, 13.696146), (12.608922, 13.468497))
            Line((12.608922, 13.468497), (12.836571, 13.741676))
            ThreePointArc((12.836571, 13.741676), (12.576727, 13.822636), (12.335742, 13.696146))
        make_face()
        with BuildLine():
            ThreePointArc((9.89664, 10.769223), (9.815679, 10.509379), (9.942169, 10.268394))
            Line((9.942169, 10.268394), (10.169819, 10.541574))
            Line((10.169819, 10.541574), (9.89664, 10.769223))
        make_face()
        with BuildLine():
            Line((5.291614, 4.687728), (5.063964, 4.414548))
            ThreePointArc((5.063964, 4.414548), (5.442444, 4.3657), (5.647214, 4.687728))
            ThreePointArc((5.647214, 4.687728), (5.613641, 4.838557), (5.519263, 4.960907))
            Line((5.519263, 4.960907), (5.291614, 4.687728))
        make_face()
        with BuildLine():
            Line((6.104648, 5.663369), (5.876998, 5.390189))
            ThreePointArc((5.876998, 5.390189), (6.255478, 5.341341), (6.460248, 5.663369))
            ThreePointArc((6.460248, 5.663369), (6.426676, 5.814198), (6.332298, 5.936548))
            Line((6.332298, 5.936548), (6.104648, 5.663369))
        make_face()
        with BuildLine():
            Line((3.392366, 2.964095), (3.665546, 2.736446))
            Line((3.665546, 2.736446), (3.893195, 3.009625))
            ThreePointArc((3.893195, 3.009625), (3.633351, 3.090585), (3.392366, 2.964095))
        make_face()
        with BuildLine():
            Line((7.730716, 7.614651), (7.503067, 7.341471))
            ThreePointArc((7.503067, 7.341471), (7.881546, 7.292623), (8.086316, 7.614651))
            ThreePointArc((8.086316, 7.614651), (8.052744, 7.76548), (7.958366, 7.88783))
            Line((7.958366, 7.88783), (7.730716, 7.614651))
        make_face()
        with BuildLine():
            ThreePointArc((3.392366, 2.964095), (3.311406, 2.704251), (3.437896, 2.463266))
            Line((3.437896, 2.463266), (3.665546, 2.736446))
            Line((3.665546, 2.736446), (3.392366, 2.964095))
        make_face()
        with BuildLine():
            Line((9.356785, 9.565933), (9.129135, 9.292753))
            ThreePointArc((9.129135, 9.292753), (9.507614, 9.243905), (9.712385, 9.565933))
            ThreePointArc((9.712385, 9.565933), (9.678812, 9.716762), (9.584434, 9.839112))
            Line((9.584434, 9.839112), (9.356785, 9.565933))
        make_face()
        with BuildLine():
            ThreePointArc((9.083605, 9.793582), (9.002645, 9.533738), (9.129135, 9.292753))
            Line((9.129135, 9.292753), (9.356785, 9.565933))
            Line((9.356785, 9.565933), (9.083605, 9.793582))
        make_face()
        with BuildLine():
            ThreePointArc((10.709674, 11.744864), (10.628714, 11.48502), (10.755204, 11.244035))
            Line((10.755204, 11.244035), (10.982853, 11.517215))
            Line((10.982853, 11.517215), (10.709674, 11.744864))
        make_face()
        with BuildLine():
            Line((13.96181, 15.647428), (14.23499, 15.419779))
            Line((14.23499, 15.419779), (14.46264, 15.692958))
            ThreePointArc((14.46264, 15.692958), (14.202795, 15.773918), (13.96181, 15.647428))
        make_face()
        with BuildLine():
            ThreePointArc((12.335742, 13.696146), (12.254782, 13.436302), (12.381272, 13.195317))
            Line((12.381272, 13.195317), (12.608922, 13.468497))
            Line((12.608922, 13.468497), (12.335742, 13.696146))
        make_face()
        with BuildLine():
            Line((9.083605, 9.793582), (9.356785, 9.565933))
            Line((9.356785, 9.565933), (9.584434, 9.839112))
            ThreePointArc((9.584434, 9.839112), (9.32459, 9.920072), (9.083605, 9.793582))
        make_face()
        with BuildLine():
            Line((5.018434, 4.915377), (5.291614, 4.687728))
            Line((5.291614, 4.687728), (5.519263, 4.960907))
            ThreePointArc((5.519263, 4.960907), (5.259419, 5.041867), (5.018434, 4.915377))
        make_face()
    extrude(amount=F1_DEPTH)


solid = f1.part
